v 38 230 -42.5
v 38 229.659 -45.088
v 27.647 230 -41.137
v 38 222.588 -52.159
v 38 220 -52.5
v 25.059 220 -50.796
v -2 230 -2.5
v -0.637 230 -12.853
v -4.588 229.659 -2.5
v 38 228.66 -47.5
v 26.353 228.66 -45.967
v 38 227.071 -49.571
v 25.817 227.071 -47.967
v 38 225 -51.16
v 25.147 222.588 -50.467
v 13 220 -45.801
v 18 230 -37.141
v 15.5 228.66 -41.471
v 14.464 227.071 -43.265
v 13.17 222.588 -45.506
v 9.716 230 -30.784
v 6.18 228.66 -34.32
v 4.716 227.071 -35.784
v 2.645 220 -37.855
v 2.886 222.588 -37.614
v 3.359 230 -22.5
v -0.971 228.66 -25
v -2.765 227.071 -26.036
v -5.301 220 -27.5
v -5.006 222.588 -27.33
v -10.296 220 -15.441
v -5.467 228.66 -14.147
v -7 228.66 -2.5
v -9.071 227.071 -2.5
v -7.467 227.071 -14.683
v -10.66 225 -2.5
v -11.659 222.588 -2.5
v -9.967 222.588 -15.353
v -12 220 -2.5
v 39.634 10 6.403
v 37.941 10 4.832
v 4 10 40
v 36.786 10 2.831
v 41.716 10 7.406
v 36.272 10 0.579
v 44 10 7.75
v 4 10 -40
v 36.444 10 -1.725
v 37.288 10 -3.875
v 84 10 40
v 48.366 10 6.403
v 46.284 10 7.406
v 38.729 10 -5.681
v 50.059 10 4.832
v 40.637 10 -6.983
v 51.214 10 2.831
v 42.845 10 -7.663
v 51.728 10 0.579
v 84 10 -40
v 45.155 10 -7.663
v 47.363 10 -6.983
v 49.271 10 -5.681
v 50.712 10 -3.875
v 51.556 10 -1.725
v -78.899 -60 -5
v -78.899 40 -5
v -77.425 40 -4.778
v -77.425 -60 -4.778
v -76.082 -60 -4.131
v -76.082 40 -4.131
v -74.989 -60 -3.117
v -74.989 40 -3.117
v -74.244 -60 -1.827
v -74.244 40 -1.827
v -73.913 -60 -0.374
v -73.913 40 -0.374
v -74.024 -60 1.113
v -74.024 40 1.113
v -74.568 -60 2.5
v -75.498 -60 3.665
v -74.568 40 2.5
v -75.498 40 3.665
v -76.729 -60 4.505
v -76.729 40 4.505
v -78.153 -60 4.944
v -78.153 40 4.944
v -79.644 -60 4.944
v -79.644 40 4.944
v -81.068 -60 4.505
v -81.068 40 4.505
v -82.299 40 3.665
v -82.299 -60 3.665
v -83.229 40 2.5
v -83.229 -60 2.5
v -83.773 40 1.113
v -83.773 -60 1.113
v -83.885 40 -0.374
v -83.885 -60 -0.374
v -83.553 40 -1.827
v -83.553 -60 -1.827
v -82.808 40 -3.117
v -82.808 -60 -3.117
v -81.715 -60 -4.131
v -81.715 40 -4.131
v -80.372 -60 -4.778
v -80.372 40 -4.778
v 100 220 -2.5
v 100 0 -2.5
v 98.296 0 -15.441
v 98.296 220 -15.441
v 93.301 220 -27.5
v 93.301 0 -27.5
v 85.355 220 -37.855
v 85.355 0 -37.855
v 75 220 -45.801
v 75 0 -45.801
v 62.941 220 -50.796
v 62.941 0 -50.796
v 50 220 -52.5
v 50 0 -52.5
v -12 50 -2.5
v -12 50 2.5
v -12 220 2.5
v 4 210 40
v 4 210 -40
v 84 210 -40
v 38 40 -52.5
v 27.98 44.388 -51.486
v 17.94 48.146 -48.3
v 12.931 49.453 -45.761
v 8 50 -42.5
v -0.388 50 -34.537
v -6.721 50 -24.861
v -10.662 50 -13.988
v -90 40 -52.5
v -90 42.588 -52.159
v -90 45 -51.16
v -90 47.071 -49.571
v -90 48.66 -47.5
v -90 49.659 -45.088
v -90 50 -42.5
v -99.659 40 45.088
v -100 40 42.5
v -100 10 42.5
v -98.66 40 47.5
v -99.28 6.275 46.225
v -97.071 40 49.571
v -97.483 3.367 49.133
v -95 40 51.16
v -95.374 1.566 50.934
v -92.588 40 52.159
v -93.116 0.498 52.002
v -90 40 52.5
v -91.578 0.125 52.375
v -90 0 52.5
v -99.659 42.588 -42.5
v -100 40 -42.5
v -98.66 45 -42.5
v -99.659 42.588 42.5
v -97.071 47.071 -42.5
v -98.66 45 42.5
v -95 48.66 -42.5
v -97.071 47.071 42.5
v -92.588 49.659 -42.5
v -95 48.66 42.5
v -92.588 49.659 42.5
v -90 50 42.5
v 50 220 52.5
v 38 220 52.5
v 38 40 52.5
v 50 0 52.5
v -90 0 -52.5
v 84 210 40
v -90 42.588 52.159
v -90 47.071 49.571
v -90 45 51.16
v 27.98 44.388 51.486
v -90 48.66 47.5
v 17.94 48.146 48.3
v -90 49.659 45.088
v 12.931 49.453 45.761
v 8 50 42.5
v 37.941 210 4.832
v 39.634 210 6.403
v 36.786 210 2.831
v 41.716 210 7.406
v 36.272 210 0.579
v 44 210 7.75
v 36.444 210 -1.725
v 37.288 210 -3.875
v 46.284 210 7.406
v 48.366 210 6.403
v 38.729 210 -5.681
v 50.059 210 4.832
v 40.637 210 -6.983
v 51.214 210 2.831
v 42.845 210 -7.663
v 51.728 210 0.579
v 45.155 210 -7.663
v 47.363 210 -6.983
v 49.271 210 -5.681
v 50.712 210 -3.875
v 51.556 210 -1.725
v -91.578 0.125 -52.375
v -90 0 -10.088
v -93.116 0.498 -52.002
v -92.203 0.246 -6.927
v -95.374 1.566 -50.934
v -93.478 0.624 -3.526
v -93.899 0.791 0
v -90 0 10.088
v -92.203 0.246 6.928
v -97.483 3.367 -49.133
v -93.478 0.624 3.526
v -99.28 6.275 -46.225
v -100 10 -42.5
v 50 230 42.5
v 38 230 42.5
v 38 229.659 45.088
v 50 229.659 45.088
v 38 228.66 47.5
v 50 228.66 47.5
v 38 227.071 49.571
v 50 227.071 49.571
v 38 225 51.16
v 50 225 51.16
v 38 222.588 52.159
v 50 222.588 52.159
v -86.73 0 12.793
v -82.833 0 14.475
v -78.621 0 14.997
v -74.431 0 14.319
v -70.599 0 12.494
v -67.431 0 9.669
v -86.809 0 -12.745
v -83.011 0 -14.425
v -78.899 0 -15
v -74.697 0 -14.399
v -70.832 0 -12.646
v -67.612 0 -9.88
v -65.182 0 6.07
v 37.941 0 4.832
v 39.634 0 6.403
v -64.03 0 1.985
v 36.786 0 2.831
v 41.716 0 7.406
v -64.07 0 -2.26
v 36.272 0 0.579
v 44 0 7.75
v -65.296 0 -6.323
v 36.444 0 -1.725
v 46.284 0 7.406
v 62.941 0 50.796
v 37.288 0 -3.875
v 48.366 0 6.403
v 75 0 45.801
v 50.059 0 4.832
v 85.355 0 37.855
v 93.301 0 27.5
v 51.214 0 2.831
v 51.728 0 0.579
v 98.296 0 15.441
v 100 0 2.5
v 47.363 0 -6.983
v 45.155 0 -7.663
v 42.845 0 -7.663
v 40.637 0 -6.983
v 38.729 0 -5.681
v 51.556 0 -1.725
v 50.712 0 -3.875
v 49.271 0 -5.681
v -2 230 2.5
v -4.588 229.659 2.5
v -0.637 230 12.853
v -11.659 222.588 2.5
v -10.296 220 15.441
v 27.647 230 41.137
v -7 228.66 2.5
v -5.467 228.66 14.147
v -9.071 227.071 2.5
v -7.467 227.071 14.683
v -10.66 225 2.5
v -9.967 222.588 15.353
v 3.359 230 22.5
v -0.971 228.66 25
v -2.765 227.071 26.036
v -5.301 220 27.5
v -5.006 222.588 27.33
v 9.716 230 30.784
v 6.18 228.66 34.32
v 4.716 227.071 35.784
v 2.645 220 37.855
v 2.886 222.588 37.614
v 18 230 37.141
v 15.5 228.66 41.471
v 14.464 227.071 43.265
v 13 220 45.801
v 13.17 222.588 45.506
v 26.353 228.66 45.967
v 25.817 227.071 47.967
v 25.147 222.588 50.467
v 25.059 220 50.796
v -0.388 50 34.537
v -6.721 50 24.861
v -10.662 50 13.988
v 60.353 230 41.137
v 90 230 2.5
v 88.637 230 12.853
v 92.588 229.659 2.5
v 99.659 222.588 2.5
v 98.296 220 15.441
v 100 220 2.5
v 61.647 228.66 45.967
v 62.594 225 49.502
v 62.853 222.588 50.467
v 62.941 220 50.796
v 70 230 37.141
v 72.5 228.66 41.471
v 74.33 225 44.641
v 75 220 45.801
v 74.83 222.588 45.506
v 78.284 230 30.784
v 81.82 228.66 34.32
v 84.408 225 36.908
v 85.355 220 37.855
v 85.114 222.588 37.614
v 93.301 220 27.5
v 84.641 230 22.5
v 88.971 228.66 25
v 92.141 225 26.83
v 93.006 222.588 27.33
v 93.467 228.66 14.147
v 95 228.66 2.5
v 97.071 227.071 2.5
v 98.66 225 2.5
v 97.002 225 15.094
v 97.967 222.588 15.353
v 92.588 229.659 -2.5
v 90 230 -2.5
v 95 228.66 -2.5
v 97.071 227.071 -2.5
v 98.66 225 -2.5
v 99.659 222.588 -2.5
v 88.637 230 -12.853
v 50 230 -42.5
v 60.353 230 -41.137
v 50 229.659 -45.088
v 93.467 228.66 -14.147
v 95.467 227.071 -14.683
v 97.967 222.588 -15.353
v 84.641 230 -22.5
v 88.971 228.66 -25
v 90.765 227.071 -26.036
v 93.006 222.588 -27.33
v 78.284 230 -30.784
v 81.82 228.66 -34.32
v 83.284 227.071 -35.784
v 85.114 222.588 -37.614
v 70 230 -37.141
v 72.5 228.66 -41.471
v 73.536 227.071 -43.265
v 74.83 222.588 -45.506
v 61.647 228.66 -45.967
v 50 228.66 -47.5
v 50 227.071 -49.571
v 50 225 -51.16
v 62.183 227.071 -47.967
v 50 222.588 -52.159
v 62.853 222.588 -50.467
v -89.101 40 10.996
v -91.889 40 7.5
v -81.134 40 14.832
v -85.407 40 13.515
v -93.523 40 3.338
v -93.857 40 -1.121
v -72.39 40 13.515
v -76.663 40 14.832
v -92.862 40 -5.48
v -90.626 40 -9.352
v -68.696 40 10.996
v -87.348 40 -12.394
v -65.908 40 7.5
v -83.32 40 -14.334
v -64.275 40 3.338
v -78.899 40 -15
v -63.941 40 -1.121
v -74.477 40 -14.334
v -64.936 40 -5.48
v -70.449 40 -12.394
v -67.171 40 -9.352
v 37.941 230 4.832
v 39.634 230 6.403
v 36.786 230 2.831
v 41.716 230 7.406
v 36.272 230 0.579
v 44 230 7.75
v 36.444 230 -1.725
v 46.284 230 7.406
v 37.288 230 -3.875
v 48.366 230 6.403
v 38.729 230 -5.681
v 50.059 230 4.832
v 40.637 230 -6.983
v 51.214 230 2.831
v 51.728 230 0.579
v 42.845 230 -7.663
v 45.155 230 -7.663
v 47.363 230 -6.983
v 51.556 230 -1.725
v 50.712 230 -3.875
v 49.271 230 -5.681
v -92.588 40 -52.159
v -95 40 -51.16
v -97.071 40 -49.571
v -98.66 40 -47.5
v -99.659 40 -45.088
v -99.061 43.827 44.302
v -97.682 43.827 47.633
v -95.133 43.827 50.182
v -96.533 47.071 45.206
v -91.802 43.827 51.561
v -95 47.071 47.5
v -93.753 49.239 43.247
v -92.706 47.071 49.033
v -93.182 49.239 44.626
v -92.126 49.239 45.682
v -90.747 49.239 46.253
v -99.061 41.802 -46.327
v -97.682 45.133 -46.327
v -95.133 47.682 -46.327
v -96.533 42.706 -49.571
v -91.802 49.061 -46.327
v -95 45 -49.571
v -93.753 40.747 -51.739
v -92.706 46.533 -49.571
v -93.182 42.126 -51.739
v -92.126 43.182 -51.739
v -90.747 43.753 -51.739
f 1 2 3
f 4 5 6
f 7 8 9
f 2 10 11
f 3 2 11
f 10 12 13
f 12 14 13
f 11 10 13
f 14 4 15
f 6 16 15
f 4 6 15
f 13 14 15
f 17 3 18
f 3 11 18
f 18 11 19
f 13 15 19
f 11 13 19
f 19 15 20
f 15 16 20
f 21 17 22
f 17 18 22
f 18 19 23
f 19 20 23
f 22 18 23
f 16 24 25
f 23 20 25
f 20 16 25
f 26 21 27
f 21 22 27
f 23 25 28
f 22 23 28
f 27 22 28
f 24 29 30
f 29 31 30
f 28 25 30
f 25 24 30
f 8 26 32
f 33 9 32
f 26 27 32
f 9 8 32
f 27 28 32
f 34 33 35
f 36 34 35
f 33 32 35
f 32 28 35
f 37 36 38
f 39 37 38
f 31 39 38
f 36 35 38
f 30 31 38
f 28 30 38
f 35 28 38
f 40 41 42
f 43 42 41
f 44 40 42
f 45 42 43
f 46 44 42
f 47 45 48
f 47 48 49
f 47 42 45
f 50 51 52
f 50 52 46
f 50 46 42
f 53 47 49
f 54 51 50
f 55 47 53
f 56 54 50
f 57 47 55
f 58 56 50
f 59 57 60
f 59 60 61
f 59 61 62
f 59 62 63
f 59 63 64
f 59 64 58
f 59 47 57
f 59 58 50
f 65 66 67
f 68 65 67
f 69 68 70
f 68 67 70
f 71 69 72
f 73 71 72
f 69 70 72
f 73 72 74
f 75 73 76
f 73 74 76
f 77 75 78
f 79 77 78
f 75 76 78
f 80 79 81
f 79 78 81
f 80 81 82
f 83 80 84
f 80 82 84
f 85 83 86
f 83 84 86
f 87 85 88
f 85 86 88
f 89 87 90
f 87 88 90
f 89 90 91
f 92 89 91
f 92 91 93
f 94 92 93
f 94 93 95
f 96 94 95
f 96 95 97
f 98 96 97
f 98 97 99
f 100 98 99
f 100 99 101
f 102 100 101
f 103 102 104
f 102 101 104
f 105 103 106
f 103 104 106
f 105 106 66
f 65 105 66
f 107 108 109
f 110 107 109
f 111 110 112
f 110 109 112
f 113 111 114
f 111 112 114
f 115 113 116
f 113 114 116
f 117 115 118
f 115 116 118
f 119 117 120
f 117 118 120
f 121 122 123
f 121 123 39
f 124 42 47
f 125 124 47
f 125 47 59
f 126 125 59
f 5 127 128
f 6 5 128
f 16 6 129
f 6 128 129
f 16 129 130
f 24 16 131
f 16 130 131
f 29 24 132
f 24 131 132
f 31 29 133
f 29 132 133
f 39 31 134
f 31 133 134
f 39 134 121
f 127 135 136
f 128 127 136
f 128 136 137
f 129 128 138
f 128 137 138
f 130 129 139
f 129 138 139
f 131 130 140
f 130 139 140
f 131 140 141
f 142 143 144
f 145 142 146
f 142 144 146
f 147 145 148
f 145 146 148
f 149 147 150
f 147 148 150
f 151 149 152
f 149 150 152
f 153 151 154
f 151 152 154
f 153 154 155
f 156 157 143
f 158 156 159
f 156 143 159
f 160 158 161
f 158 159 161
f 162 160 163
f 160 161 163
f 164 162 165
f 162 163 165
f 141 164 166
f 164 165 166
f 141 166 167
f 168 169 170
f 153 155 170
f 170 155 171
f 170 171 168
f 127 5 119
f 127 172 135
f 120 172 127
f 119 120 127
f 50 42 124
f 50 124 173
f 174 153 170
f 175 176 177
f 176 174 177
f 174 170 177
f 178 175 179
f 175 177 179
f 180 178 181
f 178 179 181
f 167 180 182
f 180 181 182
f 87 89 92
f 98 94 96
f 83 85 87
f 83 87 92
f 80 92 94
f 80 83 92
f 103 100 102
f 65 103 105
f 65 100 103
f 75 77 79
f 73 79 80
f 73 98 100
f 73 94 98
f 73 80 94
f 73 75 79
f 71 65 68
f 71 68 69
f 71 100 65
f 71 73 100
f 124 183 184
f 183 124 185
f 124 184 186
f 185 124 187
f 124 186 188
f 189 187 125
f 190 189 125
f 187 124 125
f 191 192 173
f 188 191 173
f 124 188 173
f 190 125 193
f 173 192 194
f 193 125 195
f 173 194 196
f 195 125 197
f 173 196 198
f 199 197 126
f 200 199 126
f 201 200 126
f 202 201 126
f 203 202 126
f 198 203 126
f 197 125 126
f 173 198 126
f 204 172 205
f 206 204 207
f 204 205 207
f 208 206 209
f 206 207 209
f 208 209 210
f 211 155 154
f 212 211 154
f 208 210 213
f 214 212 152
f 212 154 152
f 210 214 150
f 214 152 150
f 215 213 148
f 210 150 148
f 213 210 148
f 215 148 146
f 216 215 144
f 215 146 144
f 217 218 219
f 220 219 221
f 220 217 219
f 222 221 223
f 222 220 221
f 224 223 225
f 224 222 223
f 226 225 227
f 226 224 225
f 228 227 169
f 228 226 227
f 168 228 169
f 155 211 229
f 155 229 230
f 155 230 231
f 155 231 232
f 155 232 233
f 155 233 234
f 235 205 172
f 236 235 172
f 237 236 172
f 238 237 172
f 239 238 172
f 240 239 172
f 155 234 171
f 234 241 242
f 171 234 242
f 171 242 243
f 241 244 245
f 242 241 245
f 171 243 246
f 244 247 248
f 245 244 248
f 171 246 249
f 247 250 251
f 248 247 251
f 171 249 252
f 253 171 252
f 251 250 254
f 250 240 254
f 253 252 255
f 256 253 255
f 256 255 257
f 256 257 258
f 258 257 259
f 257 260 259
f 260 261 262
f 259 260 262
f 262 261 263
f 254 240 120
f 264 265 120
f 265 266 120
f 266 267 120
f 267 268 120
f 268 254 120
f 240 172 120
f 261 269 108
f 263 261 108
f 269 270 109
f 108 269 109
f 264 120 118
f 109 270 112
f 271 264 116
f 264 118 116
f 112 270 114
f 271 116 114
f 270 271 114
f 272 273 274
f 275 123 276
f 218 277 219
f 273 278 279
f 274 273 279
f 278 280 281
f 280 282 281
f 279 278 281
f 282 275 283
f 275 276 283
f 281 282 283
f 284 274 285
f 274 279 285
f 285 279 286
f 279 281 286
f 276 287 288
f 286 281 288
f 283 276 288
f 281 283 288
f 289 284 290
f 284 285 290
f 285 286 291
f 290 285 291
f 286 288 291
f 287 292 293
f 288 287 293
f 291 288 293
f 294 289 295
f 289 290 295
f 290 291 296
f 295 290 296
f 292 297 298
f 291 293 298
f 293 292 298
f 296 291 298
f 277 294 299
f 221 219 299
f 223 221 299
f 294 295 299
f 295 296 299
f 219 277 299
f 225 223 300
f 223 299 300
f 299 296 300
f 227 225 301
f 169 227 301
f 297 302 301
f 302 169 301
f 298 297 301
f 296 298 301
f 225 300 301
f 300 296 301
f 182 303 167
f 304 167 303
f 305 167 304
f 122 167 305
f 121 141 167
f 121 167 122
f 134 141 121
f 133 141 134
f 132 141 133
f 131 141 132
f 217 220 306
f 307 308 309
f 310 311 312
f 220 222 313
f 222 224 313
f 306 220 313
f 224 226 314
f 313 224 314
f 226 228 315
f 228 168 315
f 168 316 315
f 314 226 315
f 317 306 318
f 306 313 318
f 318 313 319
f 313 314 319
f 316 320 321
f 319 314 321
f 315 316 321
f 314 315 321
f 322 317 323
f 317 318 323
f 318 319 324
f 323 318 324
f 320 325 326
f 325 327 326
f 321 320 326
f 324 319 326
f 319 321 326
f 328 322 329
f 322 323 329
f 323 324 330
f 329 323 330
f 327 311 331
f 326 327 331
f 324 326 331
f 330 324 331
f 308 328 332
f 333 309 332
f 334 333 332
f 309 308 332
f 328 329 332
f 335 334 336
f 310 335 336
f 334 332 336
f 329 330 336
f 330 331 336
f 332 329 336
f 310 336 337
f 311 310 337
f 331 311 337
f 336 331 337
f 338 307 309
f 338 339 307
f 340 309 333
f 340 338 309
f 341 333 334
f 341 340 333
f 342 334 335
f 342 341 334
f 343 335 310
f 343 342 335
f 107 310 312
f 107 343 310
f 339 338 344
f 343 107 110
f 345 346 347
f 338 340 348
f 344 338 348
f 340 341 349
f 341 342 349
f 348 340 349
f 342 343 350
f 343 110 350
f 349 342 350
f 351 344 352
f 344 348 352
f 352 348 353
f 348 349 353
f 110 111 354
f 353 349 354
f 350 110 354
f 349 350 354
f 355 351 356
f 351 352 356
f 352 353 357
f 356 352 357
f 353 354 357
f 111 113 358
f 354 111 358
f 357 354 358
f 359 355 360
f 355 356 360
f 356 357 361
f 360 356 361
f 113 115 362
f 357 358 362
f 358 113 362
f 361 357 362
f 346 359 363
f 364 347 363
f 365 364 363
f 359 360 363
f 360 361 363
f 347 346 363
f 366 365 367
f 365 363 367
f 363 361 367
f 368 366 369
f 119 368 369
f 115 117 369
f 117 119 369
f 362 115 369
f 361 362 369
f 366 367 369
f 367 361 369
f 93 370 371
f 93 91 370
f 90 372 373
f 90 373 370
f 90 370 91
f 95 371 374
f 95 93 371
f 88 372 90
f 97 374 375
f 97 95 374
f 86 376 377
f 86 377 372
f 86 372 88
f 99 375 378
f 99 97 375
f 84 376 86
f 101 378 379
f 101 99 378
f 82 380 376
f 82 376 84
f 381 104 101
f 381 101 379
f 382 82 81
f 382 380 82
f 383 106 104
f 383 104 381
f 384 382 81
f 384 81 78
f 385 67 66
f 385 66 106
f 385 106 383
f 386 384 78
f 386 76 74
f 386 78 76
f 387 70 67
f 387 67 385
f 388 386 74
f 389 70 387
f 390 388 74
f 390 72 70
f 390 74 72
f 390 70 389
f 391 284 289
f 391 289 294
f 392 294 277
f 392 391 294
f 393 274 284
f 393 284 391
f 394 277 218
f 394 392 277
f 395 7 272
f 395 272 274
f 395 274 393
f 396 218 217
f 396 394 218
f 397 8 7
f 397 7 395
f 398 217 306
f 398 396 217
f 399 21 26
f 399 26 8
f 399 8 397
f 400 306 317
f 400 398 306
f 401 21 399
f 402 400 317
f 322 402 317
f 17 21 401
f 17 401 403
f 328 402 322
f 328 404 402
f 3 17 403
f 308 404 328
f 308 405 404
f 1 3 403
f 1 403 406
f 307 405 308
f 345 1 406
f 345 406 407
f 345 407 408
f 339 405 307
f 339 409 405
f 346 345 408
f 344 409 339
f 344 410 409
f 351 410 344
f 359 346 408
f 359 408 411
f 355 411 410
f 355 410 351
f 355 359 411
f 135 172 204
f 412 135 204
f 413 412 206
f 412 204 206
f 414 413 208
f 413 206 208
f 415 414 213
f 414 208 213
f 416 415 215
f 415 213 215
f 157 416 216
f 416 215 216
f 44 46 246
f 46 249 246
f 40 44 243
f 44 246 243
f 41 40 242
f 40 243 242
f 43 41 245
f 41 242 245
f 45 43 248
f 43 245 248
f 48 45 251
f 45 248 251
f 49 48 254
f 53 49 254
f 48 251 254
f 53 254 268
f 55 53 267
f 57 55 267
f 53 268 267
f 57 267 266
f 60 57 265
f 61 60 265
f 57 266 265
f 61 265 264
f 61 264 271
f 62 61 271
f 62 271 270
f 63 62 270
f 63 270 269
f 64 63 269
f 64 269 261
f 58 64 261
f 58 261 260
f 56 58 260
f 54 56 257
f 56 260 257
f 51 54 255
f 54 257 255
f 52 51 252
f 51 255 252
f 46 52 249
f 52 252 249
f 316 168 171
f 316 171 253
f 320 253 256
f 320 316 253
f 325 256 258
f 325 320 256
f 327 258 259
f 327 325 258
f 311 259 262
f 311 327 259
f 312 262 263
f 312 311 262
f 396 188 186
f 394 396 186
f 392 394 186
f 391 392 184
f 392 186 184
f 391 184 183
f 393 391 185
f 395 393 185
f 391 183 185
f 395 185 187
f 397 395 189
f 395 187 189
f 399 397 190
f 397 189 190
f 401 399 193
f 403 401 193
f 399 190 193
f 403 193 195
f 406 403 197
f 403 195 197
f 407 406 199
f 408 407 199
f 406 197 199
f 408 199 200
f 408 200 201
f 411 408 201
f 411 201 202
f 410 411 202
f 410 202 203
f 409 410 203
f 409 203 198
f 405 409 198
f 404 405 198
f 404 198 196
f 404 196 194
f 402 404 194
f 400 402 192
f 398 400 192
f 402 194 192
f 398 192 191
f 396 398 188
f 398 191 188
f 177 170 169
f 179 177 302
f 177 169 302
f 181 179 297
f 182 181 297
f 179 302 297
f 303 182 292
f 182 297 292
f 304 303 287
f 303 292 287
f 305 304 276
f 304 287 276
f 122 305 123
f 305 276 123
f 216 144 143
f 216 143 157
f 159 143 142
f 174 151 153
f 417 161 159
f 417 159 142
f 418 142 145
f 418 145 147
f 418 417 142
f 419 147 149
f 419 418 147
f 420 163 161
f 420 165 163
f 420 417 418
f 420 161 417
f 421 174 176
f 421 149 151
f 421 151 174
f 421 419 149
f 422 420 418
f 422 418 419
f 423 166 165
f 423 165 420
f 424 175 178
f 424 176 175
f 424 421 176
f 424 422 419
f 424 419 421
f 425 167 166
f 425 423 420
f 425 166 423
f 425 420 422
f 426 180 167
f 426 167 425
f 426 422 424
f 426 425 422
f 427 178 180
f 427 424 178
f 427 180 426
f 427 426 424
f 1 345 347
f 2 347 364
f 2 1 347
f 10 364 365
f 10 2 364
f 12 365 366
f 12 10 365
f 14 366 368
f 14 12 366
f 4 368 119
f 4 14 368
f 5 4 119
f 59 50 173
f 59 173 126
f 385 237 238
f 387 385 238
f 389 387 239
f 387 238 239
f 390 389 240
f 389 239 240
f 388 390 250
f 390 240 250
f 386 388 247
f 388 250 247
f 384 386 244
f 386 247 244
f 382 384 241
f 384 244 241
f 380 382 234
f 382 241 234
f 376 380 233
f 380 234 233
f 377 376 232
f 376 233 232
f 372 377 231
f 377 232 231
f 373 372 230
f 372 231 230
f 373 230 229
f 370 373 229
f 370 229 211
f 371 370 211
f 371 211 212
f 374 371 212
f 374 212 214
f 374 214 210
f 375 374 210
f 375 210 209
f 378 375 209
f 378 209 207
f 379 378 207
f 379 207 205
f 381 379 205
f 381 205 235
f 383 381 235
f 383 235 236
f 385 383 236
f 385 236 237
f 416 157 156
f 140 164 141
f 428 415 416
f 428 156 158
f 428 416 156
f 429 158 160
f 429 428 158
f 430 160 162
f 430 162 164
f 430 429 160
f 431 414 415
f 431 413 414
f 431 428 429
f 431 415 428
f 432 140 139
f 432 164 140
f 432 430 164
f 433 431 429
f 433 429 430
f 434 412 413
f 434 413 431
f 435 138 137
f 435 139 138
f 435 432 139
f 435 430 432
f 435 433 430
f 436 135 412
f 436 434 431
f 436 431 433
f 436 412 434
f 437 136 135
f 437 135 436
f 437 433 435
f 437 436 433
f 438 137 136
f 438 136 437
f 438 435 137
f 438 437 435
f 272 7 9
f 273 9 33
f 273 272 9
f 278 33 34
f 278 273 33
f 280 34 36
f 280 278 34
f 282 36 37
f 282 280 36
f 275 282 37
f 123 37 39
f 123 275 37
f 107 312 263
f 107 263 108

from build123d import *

# Parameters (mm, degrees)
SKETCH2_W               = 200
SKETCH2_H               = 105
SKETCH2_R               = 7.75
BOSS_EXTRUDE2_DEPTH     = 50
SKETCH3_R               = 15
CUT_EXTRUDE1_DEPTH      = 40
SKETCH4_R               = 5
BOSS_EXTRUDE3_DEPTH     = 100
SKETCH5_W               = 112
SKETCH5_H               = 105
BOSS_EXTRUDE4_DEPTH     = 180
SKETCH7_R               = 7.75
CUT_EXTRUDE2_DEPTH      = 200
CUT_EXTRUDE3_DEPTH      = 160
CUT_EXTRUDE3_DEPTH_BACK = 40
SKETCH8_W               = 80
SKETCH8_H               = 80
FILLET6_R               = 10
FILLET7_R               = 10
FILLET8_R               = 10
FILLET9_R               = 50
FILLET10_R              = 50
FILLET11_R              = 50
FILLET12_R              = 50
FILLET14_R              = 10


with BuildPart() as part:
    # Sketch2 → Boss-Extrude2 (new body)
    with BuildSketch(Plane(origin=(0, 0, 0), x_dir=(1, 0, 0), z_dir=(0, 1, 0))):
        Rectangle(SKETCH2_W, SKETCH2_H)
        with Locations(Location((44, 0, 0), (0, 0, 270))):
            Circle(SKETCH2_R, mode=Mode.SUBTRACT)
    extrude(amount=BOSS_EXTRUDE2_DEPTH)

    # Sketch3 → Cut-Extrude1 (cut)
    with BuildSketch(Plane.XZ):
        with Locations(Location((-78.898621146, 0, 0), (0, 0, 270))):
            Circle(SKETCH3_R)
    extrude(amount=-CUT_EXTRUDE1_DEPTH, mode=Mode.SUBTRACT)

    # Sketch4 → Boss-Extrude3 (add)
    with BuildSketch(Plane.XZ.offset(-40)):
        with Locations(Location((-78.898621146, 0, 0), (0, 0, 270))):
            Circle(SKETCH4_R)
    extrude(amount=BOSS_EXTRUDE3_DEPTH)

    # Sketch5 → Boss-Extrude4 (add)
    with BuildSketch(Plane(origin=(0, 50, 0), x_dir=(1, 0, 0), z_dir=(0, 1, 0))):
        with Locations((44, 0)):
            Rectangle(SKETCH5_W, SKETCH5_H)
    extrude(amount=BOSS_EXTRUDE4_DEPTH)

    # Sketch7 → Cut-Extrude2 (cut)
    with BuildSketch(Plane.XZ.offset(-50)):
        with Locations(Location((44, 0, 0), (0, 0, 90))):
            Circle(SKETCH7_R)
    extrude(amount=-CUT_EXTRUDE2_DEPTH, mode=Mode.SUBTRACT)

    # Sketch8 → Cut-Extrude3 (cut, two sides: drawn at the far end of the back side and taken through both)
    with BuildSketch(Plane(origin=(0, 50, 0), x_dir=(1, 0, 0), z_dir=(0, 1, 0)).offset(-CUT_EXTRUDE3_DEPTH_BACK)):
        with Locations((44, 0)):
            Rectangle(SKETCH8_W, SKETCH8_H)
    extrude(amount=CUT_EXTRUDE3_DEPTH + CUT_EXTRUDE3_DEPTH_BACK, mode=Mode.SUBTRACT)

    # Fillet6
    # the kernel refuses this fillet: 10 mm, written as the material it takes off along each edge
    with BuildSketch(Plane(origin=(-100, 50, 77.5), x_dir=(0, -1, 0), z_dir=(0, 0, -1))) as fillet6_piece_1:
        with BuildLine():
            CenterArc((FILLET6_R, -FILLET6_R), FILLET6_R, 90, 90)
            Line((0, -FILLET6_R), (0, 0))
            Line((0, 0), (FILLET6_R, 0))
        make_face()
    extrude(amount=155, mode=Mode.SUBTRACT)
    with BuildSketch(Plane(origin=(-100, 0, 77.5), x_dir=(0, 1, 0), z_dir=(0, 0, -1))) as fillet6_piece_2:
        with BuildLine():
            CenterArc((FILLET6_R, FILLET6_R), FILLET6_R, 180, 90)
            Line((0, FILLET6_R), (0, 0))
            Line((0, 0), (FILLET6_R, 0))
        make_face()
    extrude(amount=155, mode=Mode.SUBTRACT)
    with BuildSketch(Plane(origin=(-100, -25, 52.5), x_dir=(0, 0, -1), z_dir=(0, 1, 0)), Plane(origin=(-100, -25, -52.5), x_dir=(1, 0, 0), z_dir=(0, 1, 0))) as fillet6_piece_3:
        with BuildLine():
            CenterArc((FILLET6_R, -FILLET6_R), FILLET6_R, 90, 90)
            Line((0, -FILLET6_R), (0, 0))
            Line((0, 0), (FILLET6_R, 0))
        make_face()
    extrude(amount=100, mode=Mode.SUBTRACT)

    # Fillet7
    # the kernel refuses this fillet: 10 mm, written as the material it takes off along each edge
    with BuildSketch(Plane(origin=(-90, 40, 42.5), x_dir=(0, 0, 1), z_dir=(0, 1, 0))) as fillet7_piece_1_section:
        Polygon((0, 0), (FILLET7_R, 0), (FILLET7_R, -FILLET7_R), (0, -FILLET7_R), align=None)
    fillet7_piece_1 = extrude(amount=FILLET7_R, mode=Mode.PRIVATE)
    fillet7_piece_1 = fillet7_piece_1 - Plane(origin=(-90, 40, 42.5), x_dir=(0.7071067811865477, 0, -0.7071067811865475), z_dir=(0, 1, 0)) * Sphere(FILLET7_R, mode=Mode.PRIVATE)
    add(fillet7_piece_1, mode=Mode.SUBTRACT)
    with BuildSketch(Plane(origin=(-12, 50, 52.5), x_dir=(0, 0, -1), z_dir=(-1, 0, 0))) as fillet7_piece_2:
        with BuildLine():
            CenterArc((FILLET7_R, FILLET7_R), FILLET7_R, 180, 90)
            Line((0, FILLET7_R), (0, 0))
            Line((0, 0), (FILLET7_R, 0))
        make_face()
    extrude(amount=78, mode=Mode.SUBTRACT)

    # Fillet8
    # the kernel refuses this fillet: 10 mm, written as the material it takes off along each edge
    with BuildSketch(Plane(origin=(-90, 40, -42.5), x_dir=(0, 1, 0), z_dir=(0, 0, -1))) as fillet8_piece_1_section:
        Polygon((0, 0), (FILLET8_R, 0), (FILLET8_R, -FILLET8_R), (0, -FILLET8_R), align=None)
    fillet8_piece_1 = extrude(amount=FILLET8_R, mode=Mode.PRIVATE)
    fillet8_piece_1 = fillet8_piece_1 - Plane(origin=(-90, 40, -42.5), x_dir=(0.7071067811865475, -0.7071067811865475, 0), z_dir=(0, 0, -1)) * Sphere(FILLET8_R, mode=Mode.PRIVATE)
    add(fillet8_piece_1, mode=Mode.SUBTRACT)
    with BuildSketch(Plane(origin=(-90, 50, -52.5), x_dir=(0, -1, 0), z_dir=(1, 0, 0))) as fillet8_piece_2:
        with BuildLine():
            CenterArc((FILLET8_R, -FILLET8_R), FILLET8_R, 90, 90)
            Line((0, -FILLET8_R), (0, 0))
            Line((0, 0), (FILLET8_R, 0))
        make_face()
    extrude(amount=78, mode=Mode.SUBTRACT)

    # Fillet9
    fillet9_edges = [part.edges().sort_by_distance(p)[0] for p in [
        (100, 115, 52.5),
    ]]
    fillet(fillet9_edges, radius=FILLET9_R)

    # Fillet10
    fillet10_edges = [part.edges().sort_by_distance(p)[0] for p in [
        (-12, 135, 52.5),
    ]]
    fillet(fillet10_edges, radius=FILLET10_R)

    # Fillet11
    fillet11_edges = [part.edges().sort_by_distance(p)[0] for p in [
        (100, 115, -52.5),
    ]]
    fillet(fillet11_edges, radius=FILLET11_R)

    # Fillet12
    fillet12_edges = [part.edges().sort_by_distance(p)[0] for p in [
        (-12, 135, -52.5),
    ]]
    fillet(fillet12_edges, radius=FILLET12_R)

    # Fillet14
    fillet14_edges = [part.edges().sort_by_distance(p)[0] for p in [
        (100, 230, 0),
        (85.355339059, 230, 37.855339059),
        (44, 230, 52.5),
        (2.644660941, 230, 37.855339059),
        (44, 230, -52.5),
        (85.355339059, 230, -37.855339059),
        (-12, 230, 0),
        (2.644660941, 230, -37.855339059),
    ]]
    fillet(fillet14_edges, radius=FILLET14_R)


solid = part.part
